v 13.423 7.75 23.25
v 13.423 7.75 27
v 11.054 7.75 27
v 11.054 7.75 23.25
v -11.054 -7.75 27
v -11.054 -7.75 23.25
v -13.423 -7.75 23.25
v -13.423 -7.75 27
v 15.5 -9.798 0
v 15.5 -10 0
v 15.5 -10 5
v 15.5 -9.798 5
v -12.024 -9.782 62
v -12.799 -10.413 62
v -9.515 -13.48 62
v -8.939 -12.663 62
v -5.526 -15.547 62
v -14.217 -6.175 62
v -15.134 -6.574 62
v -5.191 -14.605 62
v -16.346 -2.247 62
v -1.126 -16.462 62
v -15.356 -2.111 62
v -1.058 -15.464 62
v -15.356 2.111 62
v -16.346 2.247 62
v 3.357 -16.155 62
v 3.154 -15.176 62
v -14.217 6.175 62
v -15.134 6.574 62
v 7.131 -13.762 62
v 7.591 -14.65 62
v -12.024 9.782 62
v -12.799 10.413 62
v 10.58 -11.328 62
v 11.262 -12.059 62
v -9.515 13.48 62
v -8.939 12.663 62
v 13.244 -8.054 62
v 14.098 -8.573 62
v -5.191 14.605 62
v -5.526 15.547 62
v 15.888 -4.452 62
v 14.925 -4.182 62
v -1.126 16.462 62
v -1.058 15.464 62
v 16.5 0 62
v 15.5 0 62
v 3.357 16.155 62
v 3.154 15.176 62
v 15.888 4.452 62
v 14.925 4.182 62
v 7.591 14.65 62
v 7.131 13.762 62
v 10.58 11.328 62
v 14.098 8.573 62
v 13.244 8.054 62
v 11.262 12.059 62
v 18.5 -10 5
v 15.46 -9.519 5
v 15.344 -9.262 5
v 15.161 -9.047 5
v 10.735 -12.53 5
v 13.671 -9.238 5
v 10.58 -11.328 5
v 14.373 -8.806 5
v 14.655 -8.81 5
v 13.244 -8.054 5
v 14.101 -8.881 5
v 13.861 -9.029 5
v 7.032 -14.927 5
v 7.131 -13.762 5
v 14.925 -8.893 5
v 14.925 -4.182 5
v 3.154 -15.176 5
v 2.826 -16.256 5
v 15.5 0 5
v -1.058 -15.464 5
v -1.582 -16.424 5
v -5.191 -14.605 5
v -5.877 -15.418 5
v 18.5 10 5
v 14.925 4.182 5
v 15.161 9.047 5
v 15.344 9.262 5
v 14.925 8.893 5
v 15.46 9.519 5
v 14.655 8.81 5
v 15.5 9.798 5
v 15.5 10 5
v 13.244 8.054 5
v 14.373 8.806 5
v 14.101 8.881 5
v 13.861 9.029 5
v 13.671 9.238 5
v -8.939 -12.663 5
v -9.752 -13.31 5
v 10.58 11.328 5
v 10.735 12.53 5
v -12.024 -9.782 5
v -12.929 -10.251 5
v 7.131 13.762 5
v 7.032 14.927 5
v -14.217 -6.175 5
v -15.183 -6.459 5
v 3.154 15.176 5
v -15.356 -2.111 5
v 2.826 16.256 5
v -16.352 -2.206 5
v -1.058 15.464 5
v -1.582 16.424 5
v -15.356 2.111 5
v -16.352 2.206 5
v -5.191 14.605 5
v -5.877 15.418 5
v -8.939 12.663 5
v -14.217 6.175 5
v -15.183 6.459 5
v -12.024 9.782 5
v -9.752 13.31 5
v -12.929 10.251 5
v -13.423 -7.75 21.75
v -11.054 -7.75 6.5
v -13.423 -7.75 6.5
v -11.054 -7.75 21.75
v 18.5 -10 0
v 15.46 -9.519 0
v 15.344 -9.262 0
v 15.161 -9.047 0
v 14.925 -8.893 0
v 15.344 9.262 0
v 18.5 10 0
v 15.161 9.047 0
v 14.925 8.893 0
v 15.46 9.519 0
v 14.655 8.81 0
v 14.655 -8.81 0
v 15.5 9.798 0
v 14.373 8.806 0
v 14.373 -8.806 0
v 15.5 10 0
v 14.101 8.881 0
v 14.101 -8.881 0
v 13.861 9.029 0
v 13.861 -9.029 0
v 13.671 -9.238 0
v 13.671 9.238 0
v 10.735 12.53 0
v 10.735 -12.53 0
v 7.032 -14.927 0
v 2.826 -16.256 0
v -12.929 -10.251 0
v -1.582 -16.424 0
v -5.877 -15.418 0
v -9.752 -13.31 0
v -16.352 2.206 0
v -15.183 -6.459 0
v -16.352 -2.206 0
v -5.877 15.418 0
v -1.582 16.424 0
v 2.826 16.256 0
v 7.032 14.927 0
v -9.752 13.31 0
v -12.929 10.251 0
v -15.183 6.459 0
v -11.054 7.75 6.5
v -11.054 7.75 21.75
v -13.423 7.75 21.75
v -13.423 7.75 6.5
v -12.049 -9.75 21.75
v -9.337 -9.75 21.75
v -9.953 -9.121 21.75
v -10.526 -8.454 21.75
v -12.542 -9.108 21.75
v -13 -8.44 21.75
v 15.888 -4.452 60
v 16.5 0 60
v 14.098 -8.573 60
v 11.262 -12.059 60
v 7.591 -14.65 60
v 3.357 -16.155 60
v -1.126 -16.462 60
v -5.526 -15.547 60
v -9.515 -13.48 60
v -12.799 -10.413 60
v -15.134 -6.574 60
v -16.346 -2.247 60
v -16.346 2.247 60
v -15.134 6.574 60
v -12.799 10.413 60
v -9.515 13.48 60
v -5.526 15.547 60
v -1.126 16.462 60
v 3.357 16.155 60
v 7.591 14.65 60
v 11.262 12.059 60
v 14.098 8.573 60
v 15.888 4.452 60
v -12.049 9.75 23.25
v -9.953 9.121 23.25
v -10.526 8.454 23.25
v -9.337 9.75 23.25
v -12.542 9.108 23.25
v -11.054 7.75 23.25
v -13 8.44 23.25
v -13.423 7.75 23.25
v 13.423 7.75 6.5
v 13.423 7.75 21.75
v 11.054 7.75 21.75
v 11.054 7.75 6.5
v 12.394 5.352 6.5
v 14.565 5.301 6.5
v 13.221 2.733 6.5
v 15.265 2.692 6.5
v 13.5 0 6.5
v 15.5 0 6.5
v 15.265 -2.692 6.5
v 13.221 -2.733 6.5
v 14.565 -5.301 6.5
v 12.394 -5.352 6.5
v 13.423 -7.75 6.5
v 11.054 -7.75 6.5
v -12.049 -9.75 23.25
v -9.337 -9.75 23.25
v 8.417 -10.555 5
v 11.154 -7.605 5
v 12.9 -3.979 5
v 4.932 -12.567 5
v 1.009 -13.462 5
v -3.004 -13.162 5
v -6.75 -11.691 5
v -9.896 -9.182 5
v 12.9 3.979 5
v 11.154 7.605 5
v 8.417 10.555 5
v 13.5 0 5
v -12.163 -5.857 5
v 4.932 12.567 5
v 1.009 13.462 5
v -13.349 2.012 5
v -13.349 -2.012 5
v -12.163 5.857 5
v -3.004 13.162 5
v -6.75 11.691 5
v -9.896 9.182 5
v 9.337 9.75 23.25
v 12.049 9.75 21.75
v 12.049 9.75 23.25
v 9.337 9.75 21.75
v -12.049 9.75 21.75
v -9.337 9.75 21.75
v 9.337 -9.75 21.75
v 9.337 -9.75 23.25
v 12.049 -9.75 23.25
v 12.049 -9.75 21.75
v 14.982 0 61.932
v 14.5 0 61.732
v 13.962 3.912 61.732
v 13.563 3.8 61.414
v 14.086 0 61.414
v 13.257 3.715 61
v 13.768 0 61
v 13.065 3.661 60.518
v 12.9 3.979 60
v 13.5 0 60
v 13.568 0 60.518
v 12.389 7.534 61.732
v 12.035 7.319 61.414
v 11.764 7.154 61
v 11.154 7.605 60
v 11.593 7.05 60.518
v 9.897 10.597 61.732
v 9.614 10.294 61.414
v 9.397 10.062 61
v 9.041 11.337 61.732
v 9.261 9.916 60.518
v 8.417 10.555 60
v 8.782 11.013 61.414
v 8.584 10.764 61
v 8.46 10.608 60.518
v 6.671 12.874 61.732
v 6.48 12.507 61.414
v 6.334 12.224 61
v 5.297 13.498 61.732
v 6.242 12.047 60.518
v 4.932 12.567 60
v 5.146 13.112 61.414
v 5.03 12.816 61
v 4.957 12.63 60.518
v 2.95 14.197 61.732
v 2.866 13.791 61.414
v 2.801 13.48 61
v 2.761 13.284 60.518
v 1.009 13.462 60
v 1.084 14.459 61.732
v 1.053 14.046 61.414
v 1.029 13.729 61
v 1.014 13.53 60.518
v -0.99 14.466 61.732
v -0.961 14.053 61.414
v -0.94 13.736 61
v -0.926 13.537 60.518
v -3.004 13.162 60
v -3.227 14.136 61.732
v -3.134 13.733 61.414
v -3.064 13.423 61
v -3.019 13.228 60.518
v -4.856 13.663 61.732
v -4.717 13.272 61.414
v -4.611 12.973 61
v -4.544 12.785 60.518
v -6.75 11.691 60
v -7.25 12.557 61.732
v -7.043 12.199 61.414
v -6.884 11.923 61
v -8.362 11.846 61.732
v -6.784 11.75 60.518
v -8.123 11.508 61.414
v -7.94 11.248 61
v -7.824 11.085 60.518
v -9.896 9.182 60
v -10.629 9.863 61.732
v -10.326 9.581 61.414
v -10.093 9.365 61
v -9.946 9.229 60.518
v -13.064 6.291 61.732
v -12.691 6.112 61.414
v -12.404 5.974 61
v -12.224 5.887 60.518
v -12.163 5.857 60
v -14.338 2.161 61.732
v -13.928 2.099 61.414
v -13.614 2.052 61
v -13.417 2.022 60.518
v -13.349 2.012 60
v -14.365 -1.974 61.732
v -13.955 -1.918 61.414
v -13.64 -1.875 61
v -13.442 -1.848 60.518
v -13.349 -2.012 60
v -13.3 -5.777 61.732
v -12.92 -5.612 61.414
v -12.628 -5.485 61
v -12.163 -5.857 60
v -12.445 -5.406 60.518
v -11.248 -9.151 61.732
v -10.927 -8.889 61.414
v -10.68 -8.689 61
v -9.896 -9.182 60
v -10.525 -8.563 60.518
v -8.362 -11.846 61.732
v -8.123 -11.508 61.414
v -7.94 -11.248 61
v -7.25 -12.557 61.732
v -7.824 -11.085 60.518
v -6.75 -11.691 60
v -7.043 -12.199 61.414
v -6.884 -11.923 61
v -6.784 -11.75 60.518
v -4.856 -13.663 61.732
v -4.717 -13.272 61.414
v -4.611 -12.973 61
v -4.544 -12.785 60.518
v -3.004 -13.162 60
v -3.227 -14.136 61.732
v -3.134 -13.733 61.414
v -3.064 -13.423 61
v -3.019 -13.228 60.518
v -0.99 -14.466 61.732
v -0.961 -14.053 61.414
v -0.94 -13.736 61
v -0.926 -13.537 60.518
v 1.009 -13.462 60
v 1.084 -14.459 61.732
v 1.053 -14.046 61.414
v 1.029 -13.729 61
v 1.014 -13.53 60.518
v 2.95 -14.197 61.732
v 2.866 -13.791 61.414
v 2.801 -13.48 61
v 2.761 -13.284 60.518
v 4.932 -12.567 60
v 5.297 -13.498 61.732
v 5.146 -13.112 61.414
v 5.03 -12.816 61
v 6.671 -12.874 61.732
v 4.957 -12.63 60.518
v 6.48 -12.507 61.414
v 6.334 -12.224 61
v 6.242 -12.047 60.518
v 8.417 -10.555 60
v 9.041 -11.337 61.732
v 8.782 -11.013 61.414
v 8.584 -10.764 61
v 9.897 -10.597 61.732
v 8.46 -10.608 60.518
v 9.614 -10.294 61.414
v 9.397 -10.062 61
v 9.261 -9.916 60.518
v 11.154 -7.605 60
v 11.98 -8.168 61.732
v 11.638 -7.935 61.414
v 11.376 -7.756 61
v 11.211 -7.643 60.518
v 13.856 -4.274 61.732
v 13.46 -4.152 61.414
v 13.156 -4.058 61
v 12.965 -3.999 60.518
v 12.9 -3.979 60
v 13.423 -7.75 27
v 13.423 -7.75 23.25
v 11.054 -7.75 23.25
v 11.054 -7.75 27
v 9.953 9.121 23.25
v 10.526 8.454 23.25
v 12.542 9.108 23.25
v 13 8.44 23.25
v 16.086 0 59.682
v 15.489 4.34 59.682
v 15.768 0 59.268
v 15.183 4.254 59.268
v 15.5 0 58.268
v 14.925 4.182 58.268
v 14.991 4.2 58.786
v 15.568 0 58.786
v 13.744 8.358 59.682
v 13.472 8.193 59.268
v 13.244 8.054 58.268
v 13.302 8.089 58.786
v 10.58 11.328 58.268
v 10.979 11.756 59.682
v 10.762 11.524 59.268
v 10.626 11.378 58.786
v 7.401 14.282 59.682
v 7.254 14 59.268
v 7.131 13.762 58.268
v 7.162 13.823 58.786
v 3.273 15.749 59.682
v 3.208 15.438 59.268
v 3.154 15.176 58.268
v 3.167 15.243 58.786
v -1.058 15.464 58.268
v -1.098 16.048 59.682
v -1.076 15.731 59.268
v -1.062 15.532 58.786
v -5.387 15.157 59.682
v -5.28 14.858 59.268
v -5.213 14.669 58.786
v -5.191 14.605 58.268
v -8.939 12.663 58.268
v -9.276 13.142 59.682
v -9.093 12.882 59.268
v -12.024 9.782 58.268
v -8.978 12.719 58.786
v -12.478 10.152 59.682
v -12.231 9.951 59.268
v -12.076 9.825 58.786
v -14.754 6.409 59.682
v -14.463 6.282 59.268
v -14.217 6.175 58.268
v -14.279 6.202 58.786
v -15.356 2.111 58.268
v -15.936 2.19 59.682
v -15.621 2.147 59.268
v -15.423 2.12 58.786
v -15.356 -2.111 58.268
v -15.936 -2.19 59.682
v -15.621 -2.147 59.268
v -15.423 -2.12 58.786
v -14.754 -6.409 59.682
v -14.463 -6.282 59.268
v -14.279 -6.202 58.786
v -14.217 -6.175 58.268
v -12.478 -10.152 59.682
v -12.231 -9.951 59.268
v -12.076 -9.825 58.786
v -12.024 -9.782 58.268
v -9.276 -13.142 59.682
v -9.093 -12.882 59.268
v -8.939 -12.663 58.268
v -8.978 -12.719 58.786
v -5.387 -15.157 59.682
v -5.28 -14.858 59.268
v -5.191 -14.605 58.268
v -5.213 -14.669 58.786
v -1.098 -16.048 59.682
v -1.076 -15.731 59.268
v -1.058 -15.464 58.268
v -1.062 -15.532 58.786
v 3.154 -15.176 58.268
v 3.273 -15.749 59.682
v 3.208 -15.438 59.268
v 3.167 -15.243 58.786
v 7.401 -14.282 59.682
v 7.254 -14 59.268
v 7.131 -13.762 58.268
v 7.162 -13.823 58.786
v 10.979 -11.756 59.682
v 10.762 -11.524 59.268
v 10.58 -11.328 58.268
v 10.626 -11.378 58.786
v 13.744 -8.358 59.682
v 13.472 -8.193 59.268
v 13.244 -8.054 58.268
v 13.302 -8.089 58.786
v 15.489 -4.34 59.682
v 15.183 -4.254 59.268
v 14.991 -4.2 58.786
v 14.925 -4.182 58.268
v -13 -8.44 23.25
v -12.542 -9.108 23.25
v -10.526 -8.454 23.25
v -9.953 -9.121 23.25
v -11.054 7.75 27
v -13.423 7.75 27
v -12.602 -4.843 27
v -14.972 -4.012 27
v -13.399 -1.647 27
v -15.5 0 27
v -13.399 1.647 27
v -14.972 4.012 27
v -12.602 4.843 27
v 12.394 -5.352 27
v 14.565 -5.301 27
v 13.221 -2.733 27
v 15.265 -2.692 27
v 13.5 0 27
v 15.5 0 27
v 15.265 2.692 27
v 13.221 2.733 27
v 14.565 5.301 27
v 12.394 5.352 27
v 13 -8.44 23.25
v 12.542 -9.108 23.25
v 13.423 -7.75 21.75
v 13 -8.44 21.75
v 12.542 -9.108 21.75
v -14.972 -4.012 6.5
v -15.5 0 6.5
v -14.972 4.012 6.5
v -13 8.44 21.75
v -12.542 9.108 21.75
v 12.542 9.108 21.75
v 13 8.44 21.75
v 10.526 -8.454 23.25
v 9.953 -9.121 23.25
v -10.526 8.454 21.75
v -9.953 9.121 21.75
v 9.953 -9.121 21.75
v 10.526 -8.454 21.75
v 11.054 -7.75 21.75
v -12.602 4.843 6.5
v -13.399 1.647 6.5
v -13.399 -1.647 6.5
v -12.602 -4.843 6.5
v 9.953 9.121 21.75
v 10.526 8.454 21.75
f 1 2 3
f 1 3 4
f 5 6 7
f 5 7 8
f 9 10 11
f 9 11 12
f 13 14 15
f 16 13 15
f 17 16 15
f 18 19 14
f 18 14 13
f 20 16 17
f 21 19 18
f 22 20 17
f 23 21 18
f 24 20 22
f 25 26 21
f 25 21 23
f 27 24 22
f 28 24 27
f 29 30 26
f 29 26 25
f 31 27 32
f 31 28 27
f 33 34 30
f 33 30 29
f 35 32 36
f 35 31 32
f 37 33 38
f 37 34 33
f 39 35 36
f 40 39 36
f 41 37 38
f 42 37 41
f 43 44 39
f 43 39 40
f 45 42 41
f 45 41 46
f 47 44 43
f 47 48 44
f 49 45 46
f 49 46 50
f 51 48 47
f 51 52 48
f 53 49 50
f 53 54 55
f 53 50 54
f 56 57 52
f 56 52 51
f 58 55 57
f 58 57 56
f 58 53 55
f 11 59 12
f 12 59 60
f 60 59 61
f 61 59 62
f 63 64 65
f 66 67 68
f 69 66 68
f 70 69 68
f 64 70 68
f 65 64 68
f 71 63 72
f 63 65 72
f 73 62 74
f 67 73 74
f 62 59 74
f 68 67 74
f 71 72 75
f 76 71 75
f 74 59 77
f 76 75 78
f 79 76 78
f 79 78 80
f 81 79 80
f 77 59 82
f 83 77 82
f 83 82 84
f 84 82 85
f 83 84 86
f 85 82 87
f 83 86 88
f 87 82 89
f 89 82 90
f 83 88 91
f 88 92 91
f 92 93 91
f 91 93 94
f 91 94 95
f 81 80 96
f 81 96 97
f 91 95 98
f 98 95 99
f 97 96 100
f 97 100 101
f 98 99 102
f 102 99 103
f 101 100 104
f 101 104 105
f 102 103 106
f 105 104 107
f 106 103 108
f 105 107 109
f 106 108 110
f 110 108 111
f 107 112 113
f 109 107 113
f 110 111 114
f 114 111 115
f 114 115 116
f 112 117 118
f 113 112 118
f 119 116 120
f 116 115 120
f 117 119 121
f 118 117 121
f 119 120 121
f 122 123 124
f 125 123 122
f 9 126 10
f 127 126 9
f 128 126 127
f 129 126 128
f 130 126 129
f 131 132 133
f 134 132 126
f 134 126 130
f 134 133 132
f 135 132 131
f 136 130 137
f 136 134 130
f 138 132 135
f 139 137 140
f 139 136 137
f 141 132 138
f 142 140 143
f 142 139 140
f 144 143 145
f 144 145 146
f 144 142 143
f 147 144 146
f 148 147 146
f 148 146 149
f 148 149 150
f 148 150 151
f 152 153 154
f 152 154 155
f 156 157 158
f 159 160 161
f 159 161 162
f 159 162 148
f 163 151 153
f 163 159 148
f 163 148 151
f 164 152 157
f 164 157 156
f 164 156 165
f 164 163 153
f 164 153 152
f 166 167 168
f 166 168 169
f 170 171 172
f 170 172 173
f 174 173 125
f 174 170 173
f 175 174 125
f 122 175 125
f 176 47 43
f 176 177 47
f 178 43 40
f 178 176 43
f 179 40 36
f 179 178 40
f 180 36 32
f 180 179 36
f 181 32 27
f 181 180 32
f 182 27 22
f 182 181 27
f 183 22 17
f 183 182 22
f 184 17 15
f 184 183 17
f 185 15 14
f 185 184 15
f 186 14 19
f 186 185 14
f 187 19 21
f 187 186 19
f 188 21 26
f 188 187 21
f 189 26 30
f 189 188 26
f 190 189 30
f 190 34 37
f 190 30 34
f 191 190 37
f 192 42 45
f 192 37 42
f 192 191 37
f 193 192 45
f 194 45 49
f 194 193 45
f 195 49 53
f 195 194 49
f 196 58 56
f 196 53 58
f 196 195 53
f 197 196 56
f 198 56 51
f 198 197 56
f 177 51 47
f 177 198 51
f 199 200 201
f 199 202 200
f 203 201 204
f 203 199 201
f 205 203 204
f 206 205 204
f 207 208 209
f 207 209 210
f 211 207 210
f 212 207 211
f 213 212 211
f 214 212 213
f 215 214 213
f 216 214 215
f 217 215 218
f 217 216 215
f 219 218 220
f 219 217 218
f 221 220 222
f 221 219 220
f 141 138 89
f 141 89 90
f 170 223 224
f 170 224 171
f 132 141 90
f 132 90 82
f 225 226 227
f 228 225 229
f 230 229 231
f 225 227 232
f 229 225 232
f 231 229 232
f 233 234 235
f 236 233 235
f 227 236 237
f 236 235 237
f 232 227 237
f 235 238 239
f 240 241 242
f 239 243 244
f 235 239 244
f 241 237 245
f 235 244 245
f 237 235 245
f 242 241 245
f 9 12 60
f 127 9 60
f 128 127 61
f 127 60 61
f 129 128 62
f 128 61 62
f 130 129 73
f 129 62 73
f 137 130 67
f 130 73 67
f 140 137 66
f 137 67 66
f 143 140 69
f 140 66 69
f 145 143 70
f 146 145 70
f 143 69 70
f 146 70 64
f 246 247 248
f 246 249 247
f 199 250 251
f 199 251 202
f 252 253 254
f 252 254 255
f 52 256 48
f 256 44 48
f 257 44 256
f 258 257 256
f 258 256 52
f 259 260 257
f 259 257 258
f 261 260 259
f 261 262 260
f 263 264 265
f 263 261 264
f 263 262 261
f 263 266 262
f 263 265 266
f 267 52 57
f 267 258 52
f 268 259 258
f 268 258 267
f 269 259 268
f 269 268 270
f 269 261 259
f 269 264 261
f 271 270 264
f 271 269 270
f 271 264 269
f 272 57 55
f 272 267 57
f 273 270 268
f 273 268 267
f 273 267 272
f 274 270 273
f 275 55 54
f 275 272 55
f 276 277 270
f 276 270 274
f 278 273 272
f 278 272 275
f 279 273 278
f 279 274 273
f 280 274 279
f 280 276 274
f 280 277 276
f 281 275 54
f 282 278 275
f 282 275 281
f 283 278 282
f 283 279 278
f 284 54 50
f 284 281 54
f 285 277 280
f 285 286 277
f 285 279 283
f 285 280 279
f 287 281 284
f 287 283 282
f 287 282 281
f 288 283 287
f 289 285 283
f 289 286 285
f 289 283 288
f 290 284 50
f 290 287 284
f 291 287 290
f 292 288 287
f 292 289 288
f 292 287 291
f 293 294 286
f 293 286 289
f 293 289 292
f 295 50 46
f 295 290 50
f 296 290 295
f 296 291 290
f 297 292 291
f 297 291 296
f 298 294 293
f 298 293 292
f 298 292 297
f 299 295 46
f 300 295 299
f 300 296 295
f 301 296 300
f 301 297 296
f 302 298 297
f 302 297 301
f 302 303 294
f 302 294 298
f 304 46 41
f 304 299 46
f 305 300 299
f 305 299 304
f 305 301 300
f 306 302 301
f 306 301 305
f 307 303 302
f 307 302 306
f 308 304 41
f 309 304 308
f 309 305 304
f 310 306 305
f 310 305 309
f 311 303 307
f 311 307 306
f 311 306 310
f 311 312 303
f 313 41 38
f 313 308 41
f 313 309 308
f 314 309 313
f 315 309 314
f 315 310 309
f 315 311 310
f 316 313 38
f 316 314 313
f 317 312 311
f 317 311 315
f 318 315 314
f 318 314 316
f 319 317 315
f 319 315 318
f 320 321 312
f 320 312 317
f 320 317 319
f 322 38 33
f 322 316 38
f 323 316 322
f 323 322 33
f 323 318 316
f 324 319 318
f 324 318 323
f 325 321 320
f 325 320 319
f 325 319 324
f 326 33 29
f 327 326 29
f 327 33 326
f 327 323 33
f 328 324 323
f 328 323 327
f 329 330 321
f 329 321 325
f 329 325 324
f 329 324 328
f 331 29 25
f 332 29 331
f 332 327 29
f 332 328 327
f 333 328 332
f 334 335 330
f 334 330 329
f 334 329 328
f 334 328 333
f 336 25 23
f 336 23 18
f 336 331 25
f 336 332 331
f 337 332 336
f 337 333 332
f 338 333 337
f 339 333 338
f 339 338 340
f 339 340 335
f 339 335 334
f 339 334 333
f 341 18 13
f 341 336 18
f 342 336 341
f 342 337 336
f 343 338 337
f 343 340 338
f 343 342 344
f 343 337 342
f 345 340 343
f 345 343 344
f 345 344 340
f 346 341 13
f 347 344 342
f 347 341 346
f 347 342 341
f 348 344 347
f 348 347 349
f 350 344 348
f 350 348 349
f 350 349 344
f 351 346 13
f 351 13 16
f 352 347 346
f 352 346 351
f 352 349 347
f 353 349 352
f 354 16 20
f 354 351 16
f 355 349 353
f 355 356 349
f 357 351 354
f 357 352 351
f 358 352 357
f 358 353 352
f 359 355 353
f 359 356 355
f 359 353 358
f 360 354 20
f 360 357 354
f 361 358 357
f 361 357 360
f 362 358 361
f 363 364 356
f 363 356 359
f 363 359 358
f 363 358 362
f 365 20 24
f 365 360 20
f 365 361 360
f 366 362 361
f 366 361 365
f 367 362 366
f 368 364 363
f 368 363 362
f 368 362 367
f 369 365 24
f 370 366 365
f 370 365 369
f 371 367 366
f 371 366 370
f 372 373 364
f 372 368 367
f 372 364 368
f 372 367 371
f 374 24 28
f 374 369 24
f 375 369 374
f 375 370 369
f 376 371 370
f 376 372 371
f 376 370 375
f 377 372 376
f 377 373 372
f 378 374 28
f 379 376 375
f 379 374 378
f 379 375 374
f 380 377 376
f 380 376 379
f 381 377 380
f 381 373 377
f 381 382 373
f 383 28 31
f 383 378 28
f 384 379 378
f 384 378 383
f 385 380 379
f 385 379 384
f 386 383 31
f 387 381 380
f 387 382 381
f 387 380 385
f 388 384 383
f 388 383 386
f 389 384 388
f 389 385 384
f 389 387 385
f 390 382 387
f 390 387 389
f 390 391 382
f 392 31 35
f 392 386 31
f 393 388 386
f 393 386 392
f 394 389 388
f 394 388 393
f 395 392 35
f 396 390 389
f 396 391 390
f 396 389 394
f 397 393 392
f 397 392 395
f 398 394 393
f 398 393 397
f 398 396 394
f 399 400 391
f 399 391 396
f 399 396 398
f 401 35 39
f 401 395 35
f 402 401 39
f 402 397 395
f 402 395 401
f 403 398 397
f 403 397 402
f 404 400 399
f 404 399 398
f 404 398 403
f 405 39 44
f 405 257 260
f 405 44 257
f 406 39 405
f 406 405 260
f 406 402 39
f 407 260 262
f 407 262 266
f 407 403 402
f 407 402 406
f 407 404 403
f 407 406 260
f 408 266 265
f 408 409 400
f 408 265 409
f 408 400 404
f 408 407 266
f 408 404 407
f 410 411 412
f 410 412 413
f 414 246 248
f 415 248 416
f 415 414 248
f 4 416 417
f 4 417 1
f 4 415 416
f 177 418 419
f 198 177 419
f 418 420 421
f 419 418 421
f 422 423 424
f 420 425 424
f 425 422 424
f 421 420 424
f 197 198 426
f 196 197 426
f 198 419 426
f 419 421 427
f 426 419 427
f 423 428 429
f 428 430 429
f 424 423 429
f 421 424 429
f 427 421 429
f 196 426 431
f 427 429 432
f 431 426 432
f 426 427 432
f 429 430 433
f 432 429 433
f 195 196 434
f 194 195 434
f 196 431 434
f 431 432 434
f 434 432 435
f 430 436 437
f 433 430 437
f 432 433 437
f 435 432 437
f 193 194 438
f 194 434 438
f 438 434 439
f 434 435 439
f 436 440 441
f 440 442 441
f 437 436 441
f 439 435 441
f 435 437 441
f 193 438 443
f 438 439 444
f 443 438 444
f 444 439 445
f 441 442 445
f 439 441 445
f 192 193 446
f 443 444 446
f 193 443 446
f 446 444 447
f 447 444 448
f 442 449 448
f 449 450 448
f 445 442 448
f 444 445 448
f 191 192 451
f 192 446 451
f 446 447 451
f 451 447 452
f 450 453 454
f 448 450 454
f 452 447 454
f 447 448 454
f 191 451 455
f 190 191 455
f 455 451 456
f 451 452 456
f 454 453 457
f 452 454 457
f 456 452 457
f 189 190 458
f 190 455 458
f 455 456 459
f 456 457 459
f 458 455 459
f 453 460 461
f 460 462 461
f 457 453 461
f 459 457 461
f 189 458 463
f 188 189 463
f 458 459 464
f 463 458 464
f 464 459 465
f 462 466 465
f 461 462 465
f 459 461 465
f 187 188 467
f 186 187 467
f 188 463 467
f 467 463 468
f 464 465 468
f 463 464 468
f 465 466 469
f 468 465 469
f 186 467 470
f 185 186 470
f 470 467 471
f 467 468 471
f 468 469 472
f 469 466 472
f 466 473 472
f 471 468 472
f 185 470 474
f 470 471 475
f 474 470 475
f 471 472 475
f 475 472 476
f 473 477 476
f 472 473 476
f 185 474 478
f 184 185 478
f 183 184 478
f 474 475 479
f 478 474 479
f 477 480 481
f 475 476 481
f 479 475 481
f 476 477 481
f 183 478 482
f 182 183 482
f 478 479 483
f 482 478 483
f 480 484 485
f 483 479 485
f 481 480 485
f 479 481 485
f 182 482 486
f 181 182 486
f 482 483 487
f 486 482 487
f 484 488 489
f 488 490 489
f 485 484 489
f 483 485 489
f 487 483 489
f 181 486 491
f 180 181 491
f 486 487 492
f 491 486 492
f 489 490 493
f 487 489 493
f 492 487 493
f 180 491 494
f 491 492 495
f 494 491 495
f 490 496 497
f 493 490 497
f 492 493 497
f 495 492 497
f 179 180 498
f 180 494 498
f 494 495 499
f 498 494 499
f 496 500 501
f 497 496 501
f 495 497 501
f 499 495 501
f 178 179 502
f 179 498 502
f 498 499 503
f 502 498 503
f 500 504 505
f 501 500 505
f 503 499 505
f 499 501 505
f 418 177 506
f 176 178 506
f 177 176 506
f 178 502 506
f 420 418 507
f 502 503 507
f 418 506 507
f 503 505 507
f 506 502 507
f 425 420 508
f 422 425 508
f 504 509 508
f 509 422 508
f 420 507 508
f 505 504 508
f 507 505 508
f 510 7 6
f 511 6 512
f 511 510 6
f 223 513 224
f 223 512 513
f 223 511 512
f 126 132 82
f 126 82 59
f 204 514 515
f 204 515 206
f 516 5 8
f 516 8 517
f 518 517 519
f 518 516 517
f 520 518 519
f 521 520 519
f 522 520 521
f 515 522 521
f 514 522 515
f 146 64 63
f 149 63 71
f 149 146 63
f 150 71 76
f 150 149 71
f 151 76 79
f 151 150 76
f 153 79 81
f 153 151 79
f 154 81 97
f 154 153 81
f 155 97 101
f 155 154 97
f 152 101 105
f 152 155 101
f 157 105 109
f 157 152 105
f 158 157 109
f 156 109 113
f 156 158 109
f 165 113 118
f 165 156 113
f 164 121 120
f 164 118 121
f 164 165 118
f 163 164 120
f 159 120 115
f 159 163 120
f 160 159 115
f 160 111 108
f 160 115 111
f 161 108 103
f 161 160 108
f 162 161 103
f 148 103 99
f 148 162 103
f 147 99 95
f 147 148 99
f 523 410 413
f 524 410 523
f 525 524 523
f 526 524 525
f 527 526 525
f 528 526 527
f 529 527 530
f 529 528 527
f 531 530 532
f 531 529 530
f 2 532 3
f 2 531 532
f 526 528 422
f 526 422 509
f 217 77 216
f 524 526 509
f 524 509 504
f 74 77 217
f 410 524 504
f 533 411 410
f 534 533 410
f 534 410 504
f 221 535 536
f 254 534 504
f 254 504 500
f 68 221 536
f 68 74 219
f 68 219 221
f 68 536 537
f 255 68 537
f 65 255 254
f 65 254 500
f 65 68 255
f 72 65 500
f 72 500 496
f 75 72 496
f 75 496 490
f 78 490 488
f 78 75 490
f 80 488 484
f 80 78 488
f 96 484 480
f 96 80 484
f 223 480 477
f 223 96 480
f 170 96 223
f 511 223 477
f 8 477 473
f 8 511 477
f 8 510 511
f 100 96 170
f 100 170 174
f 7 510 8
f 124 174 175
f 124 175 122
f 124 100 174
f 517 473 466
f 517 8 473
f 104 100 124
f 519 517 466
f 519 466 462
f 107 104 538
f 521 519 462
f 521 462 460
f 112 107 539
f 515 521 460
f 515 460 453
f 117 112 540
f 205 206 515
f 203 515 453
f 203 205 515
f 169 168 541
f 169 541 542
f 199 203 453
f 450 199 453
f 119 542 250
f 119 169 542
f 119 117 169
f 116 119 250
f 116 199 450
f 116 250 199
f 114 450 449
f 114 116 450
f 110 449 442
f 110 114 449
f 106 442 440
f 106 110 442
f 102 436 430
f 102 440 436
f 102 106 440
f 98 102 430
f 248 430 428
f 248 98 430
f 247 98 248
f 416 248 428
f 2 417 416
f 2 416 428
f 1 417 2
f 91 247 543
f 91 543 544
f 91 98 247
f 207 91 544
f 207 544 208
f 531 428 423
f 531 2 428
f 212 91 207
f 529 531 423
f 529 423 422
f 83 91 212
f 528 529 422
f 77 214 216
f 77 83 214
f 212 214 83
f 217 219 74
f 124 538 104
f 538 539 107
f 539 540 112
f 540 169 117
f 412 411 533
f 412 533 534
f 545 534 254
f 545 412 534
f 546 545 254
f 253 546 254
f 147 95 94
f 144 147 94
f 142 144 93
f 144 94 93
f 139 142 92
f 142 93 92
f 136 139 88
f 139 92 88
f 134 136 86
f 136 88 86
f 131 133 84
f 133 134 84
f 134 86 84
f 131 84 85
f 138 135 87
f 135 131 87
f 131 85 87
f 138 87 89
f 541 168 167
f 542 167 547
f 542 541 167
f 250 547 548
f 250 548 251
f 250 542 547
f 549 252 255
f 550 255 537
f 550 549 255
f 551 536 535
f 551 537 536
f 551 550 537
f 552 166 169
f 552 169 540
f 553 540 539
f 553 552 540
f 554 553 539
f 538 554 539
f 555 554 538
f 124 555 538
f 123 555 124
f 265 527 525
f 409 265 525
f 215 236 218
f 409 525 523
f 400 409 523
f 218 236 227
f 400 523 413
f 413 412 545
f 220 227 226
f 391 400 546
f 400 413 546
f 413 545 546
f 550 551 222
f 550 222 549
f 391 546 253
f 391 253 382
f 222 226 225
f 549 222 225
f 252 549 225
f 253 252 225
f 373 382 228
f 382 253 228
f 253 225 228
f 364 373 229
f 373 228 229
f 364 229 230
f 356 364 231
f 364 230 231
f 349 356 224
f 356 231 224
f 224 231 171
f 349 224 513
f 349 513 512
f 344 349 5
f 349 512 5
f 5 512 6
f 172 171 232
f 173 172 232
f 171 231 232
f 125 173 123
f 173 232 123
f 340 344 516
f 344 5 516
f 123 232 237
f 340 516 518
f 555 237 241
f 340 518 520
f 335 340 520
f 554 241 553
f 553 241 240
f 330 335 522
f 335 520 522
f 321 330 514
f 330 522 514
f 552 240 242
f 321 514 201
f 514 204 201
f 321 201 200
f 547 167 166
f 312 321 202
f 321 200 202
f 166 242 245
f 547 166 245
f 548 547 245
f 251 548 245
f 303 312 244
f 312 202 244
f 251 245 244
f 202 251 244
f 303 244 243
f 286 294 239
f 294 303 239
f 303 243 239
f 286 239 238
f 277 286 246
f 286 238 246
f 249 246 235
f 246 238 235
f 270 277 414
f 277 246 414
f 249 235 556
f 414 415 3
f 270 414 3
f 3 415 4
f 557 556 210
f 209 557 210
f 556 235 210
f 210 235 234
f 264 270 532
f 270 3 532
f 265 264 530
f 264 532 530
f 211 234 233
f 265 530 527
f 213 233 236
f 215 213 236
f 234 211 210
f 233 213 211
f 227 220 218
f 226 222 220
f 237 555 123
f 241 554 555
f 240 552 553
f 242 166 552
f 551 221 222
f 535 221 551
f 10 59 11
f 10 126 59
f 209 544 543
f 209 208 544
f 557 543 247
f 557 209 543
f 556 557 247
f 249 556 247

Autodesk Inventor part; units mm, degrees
ref_plane "XZ Plane" through (0, 0, 0) normal (0, 1, 0) x (-1, 0, 0)
ref_plane "XY Plane" through (0, 0, 0) normal (0, 0, 1) x (1, 0, 0)
sketch "Esboço1" plane through (0, 0, 0) normal (0, 0, 1) x (1, 0, 0)
  circle A0 centre (0, 0) radius 15.5
  dimension "d0" = 31
extrude "Extrusão1" add sketch "Esboço1" along normal blind 2
sketch "Esboço2" plane through (0, 0, 2) normal (0, 0, 1) x (1, 0, 0)
  circle A0 centre (0, 0) radius 15.5 projected
  circle A1 centre (0, 0) radius 13.5
  dimension "d3" = 2
extrude "Extrusão2" add sketch "Esboço2" along normal blind 58
ref_plane "Plano de trabalho4" through (29, 0, 0) normal (1, 0, 0) x (0, 1, 0)
sketch "Esboço5" plane through (29, 0, 0) normal (1, 0, 0) x (0, 1, 0)
  line L0 (-7.75, 27) -> (7.75, 27)
  line L1 (7.75, 27) -> (7.75, 6.5)
  line L2 (7.75, 6.5) -> (-7.75, 6.5)
  line L3 (-7.75, 6.5) -> (-7.75, 27)
  line L4 (-7.75, 27) -> (7.75, 6.5) construction
  line L5 (7.75, 27) -> (-7.75, 6.5) construction
  line L6 (15.5, 0) -> (-15.5, 0) projected
  point P0 (0, 0)
  point P1 (0, 16.75)
  dimension "d15" = 20.5
  dimension "d16" = 15.5
  dimension "d17" = 0
  dimension "d18" = 6.5
extrude "Extrusão4" cut sketch "Esboço5" against normal through all
sketch "Esboço7" plane through (0, 0, 60) normal (0, 0, 1) x (1, 0, 0)
  circle A0 centre (0, 0) radius 16.5
  circle A1 centre (0, 0) radius 13.5 projected
  dimension "d28" = 33
extrude "Extrusão6" add sketch "Esboço7" along normal blind 2
fillet "Arredondamento2" radius 2 1 edges at (-13.5, 0, 62)
fillet "Arredondamento3" radius 2 1 edges at (-15.5, 0, 60)
sketch "Sketch8" plane through (0, 0, 0) normal (1, 0, 0) x (0, 1, 0)
  line L0 (-9.75, 21.75) -> (9.75, 21.75)
  line L1 (9.75, 21.75) -> (9.75, 23.25)
  line L2 (9.75, 23.25) -> (-9.75, 23.25)
  line L3 (-9.75, 23.25) -> (-9.75, 21.75)
  line L4 (-7.75, 27) -> (7.75, 27) projected
  line L5 (7.75, 27) -> (7.75, 6.5) projected
  line L6 (-7.75, 6.5) -> (-7.75, 27) projected
  point P0 (0, 0)
  dimension "d37" = 3.75
  dimension "d38" = 1.5
  dimension "d39" = 2
  dimension "d40" = 2
extrude "Extrusion7" cut sketch "Sketch8" along normal mid plane 50 contours L3 L2 L6 L0 | L6 L2 L5 L0 | L5 L2 L1 L0
sketch "Sketch11" plane through (0, 0, 0) normal (0, 0, -1) x (-1, 0, 0)
  line L0 (-18.5, -10) -> (-15.5, -10)
  line L1 (-15.5, -10) -> (-15.5, 10)
  line L2 (-15.5, 10) -> (-18.5, 10)
  line L3 (-18.5, 10) -> (-18.5, -10)
  circle A0 centre (0, 0) radius 16.5 projected
  point P0 (-16.5, 0)
  point P1 (-15.5, 5.6569)
  point P2 (-15.5, -5.6569)
  dimension "d48" = 3
  dimension "d49" = 2
  dimension "d50" = 20
  dimension "d51" = 10
extrude "Extrusion9" add sketch "Sketch11" against normal blind 5
fillet "Fillet4" radius 1 2 edges at (15.5, 5.6569, 2.5) (15.5, -5.6569, 2.5)
properties part number "peca1v2"
